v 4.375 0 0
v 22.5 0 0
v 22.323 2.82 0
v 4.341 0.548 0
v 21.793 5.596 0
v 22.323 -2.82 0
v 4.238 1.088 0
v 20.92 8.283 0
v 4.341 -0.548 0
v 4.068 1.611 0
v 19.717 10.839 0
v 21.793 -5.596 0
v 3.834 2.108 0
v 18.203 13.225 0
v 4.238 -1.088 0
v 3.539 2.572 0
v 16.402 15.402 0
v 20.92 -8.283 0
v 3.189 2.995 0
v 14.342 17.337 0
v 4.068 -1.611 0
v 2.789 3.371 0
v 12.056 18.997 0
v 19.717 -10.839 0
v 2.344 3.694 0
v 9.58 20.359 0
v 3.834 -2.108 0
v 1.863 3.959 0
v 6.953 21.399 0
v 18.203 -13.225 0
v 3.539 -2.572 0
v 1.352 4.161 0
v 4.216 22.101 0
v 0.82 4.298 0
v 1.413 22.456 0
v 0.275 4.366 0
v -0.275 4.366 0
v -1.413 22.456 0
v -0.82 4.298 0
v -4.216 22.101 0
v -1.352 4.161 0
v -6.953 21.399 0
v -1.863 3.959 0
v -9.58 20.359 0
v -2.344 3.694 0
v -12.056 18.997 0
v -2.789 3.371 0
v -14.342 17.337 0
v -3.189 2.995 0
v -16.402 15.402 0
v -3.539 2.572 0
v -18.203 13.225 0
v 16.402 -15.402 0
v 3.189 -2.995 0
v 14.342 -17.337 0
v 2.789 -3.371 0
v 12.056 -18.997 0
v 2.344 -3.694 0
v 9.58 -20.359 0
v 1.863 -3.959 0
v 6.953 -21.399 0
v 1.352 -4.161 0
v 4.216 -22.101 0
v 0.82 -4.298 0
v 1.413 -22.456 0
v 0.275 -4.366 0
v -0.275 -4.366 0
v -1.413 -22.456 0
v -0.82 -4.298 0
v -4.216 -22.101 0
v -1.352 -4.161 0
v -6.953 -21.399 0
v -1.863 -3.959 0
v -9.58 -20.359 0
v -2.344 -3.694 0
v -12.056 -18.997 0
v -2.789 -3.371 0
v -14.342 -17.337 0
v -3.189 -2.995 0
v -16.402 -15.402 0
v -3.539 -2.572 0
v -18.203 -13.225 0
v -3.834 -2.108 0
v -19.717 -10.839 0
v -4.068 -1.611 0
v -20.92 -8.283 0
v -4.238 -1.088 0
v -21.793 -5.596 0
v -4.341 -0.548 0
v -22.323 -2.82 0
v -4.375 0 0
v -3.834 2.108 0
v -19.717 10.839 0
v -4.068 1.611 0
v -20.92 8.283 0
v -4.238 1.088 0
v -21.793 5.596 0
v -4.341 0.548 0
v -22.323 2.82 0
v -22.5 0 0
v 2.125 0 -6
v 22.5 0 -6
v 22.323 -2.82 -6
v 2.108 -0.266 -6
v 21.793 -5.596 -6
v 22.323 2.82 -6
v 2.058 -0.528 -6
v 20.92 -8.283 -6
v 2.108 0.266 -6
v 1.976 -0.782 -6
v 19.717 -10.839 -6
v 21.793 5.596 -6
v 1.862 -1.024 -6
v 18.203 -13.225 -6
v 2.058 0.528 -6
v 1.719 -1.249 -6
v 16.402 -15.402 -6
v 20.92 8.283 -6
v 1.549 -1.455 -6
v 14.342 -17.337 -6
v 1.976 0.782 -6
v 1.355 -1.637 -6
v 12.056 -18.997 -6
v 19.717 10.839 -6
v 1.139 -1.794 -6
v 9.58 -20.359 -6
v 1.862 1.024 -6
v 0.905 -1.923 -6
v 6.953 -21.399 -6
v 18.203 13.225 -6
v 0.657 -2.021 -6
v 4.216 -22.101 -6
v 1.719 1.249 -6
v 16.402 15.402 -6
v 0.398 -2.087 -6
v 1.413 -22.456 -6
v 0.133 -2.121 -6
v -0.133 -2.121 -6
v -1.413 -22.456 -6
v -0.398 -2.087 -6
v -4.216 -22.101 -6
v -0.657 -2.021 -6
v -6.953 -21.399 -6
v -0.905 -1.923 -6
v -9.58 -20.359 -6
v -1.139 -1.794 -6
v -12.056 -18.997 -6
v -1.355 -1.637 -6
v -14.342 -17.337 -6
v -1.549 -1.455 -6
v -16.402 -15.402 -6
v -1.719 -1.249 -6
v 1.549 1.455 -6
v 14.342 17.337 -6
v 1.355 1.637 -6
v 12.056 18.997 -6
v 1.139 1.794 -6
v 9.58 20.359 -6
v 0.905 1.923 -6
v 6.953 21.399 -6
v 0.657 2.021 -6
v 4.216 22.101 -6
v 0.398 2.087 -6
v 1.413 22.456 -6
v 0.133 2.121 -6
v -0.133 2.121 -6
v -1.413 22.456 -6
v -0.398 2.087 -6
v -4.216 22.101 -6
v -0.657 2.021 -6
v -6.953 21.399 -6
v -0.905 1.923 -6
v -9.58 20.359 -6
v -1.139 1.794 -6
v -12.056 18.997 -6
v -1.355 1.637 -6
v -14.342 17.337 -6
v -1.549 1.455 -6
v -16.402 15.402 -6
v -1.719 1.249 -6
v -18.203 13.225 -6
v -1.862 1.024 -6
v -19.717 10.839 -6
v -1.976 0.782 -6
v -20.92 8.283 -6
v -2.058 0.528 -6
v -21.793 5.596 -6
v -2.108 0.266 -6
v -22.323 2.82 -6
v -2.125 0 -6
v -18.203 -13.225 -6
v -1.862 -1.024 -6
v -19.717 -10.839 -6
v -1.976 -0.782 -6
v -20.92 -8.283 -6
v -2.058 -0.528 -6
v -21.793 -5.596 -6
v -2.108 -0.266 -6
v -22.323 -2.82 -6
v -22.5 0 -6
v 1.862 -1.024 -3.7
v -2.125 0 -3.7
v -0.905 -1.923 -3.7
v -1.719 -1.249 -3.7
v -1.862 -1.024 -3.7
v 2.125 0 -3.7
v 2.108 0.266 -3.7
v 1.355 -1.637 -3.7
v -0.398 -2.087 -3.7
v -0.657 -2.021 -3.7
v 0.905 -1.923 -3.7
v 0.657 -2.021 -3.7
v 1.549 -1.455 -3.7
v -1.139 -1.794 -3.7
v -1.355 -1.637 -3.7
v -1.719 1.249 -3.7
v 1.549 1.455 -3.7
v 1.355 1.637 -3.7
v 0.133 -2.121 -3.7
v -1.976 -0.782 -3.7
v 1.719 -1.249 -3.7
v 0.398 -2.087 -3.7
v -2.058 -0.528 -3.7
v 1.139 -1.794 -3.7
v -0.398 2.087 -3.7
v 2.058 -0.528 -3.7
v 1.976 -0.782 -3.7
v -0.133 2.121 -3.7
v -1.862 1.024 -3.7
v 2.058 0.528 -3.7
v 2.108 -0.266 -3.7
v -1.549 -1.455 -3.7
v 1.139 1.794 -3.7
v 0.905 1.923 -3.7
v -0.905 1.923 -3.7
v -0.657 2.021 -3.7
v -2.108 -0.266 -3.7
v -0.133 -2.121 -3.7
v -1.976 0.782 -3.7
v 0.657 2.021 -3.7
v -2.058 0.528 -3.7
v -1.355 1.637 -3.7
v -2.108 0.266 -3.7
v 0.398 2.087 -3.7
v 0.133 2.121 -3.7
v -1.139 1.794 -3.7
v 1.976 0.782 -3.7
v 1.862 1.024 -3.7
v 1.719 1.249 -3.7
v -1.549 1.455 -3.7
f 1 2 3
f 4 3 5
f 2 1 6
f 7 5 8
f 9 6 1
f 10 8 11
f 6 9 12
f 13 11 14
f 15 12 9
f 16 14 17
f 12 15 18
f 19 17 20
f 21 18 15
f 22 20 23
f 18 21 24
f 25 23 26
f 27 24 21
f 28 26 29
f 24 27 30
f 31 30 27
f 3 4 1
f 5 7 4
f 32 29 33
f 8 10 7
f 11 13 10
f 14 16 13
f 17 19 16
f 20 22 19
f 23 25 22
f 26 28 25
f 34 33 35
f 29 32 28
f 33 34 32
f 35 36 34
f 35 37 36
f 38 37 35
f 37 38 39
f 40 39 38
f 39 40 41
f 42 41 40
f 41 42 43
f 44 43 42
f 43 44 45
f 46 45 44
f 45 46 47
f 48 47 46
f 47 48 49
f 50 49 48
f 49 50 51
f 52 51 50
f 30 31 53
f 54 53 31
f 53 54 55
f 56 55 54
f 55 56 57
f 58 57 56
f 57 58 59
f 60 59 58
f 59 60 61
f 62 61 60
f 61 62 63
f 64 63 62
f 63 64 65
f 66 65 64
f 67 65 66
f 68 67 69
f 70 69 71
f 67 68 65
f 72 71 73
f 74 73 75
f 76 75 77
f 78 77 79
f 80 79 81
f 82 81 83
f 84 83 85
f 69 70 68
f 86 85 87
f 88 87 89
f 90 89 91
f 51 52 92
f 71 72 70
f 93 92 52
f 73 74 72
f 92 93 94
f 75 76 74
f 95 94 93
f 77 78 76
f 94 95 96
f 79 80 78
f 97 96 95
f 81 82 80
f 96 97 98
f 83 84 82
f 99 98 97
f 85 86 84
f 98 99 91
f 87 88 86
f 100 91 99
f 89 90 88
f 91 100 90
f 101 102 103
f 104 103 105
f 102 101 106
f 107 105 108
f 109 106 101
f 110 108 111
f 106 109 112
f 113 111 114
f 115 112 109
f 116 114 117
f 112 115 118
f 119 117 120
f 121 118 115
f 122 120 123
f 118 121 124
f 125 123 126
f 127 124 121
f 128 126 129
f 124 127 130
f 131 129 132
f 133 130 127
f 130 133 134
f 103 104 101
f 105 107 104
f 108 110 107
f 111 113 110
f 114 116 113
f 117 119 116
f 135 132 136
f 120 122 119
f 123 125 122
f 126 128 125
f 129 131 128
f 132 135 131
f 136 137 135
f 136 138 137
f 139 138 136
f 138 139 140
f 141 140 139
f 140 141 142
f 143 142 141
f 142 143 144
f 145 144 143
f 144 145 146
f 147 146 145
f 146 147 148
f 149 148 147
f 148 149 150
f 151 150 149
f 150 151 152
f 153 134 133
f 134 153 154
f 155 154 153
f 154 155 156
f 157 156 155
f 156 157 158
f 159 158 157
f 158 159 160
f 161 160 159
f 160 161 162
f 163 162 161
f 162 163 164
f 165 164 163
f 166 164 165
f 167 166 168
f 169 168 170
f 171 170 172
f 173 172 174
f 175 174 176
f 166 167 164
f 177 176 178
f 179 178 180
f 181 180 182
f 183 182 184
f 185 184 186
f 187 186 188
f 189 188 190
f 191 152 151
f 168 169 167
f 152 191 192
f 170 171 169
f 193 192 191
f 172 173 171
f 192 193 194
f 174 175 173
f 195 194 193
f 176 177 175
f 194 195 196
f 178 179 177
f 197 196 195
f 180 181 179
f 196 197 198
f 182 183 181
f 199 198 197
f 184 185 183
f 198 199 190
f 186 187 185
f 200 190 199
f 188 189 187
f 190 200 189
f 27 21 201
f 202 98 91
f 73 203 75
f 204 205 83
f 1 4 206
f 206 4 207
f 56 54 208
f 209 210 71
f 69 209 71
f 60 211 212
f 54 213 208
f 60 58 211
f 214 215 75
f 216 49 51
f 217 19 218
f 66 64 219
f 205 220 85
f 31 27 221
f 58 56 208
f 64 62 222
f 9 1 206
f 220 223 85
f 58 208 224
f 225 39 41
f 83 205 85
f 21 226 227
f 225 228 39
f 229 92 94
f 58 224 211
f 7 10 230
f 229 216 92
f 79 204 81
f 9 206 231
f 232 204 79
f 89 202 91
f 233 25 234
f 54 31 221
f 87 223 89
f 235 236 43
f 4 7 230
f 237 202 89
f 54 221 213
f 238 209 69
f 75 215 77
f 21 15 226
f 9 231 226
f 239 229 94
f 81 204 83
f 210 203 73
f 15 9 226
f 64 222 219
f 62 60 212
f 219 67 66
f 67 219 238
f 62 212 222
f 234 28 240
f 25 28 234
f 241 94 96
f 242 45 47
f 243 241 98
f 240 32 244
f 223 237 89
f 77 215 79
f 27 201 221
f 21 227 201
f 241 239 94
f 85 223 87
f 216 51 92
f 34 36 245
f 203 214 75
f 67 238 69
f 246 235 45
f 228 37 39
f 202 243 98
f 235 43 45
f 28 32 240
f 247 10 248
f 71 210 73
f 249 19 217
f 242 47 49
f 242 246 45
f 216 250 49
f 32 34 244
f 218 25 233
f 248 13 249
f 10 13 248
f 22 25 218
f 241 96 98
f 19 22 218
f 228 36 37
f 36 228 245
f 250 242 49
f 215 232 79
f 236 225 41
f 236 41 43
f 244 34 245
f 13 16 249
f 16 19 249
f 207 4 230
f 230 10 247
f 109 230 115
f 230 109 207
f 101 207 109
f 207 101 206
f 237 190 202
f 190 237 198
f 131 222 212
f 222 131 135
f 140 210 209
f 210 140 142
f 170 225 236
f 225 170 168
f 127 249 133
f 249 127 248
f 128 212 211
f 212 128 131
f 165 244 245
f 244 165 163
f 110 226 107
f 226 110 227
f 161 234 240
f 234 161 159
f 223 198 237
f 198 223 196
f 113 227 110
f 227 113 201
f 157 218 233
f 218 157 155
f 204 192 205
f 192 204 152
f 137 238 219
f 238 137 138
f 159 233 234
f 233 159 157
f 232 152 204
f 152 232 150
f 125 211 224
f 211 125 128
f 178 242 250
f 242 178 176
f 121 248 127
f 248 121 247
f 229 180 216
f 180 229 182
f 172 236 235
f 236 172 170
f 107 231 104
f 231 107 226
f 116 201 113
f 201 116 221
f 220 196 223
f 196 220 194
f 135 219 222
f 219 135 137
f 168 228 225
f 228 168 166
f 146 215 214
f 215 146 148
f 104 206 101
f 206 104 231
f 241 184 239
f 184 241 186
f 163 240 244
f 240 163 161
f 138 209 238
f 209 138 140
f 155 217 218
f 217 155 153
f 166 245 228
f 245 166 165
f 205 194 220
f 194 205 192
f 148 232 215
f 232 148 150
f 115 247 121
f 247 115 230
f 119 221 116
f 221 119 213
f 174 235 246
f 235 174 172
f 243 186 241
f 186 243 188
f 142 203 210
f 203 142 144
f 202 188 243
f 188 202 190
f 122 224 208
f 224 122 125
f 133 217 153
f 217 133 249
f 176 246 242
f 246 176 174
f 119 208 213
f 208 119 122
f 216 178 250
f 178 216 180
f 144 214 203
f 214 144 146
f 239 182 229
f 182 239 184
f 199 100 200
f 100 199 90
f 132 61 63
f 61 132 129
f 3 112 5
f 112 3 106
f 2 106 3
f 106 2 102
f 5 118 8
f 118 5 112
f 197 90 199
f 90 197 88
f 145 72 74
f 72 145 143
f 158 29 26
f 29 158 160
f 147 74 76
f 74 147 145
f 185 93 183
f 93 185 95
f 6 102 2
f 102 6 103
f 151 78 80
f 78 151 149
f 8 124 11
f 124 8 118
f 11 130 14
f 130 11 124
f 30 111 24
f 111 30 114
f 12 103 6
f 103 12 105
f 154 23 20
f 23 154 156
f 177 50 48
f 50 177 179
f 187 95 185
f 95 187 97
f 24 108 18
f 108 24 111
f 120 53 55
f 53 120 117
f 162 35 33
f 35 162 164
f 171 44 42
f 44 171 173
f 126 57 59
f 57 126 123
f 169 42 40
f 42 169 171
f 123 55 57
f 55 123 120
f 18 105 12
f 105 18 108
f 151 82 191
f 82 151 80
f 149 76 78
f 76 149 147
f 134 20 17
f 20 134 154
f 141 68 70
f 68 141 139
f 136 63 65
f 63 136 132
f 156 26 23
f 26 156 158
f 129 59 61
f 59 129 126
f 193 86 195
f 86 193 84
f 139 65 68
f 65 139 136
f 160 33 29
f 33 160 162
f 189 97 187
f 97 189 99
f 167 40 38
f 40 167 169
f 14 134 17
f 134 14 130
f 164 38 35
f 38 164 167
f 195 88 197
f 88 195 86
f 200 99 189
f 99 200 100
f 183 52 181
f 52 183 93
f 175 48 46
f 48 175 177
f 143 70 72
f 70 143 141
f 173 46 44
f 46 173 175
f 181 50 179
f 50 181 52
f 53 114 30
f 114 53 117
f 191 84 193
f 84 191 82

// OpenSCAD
$fn = 50;


difference() {
	union() {
		translate(v = [0, 0, -6.0000000000]) {
			cylinder(h = 6, r = 22.5000000000);
		}
	}
	union() {
		translate(v = [0, 0, 0]) {
			rotate(a = [0, 0, 0]) {
				difference() {
					union() {
						translate(v = [0, 0, -6.0000000000]) {
							cylinder(h = 6, r = 2.0000000000);
						}
						translate(v = [0, 0, -3.7000000000]) {
							cylinder(h = 3.7000000000, r1 = 2.1250000000, r2 = 4.3750000000);
						}
						translate(v = [0, 0, -6.0000000000]) {
							cylinder(h = 6, r = 2.1250000000);
						}
						translate(v = [0, 0, -6.0000000000]) {
							cylinder(h = 6, r = 2.0000000000);
						}
					}
					union();
				}
			}
		}
	}
}
